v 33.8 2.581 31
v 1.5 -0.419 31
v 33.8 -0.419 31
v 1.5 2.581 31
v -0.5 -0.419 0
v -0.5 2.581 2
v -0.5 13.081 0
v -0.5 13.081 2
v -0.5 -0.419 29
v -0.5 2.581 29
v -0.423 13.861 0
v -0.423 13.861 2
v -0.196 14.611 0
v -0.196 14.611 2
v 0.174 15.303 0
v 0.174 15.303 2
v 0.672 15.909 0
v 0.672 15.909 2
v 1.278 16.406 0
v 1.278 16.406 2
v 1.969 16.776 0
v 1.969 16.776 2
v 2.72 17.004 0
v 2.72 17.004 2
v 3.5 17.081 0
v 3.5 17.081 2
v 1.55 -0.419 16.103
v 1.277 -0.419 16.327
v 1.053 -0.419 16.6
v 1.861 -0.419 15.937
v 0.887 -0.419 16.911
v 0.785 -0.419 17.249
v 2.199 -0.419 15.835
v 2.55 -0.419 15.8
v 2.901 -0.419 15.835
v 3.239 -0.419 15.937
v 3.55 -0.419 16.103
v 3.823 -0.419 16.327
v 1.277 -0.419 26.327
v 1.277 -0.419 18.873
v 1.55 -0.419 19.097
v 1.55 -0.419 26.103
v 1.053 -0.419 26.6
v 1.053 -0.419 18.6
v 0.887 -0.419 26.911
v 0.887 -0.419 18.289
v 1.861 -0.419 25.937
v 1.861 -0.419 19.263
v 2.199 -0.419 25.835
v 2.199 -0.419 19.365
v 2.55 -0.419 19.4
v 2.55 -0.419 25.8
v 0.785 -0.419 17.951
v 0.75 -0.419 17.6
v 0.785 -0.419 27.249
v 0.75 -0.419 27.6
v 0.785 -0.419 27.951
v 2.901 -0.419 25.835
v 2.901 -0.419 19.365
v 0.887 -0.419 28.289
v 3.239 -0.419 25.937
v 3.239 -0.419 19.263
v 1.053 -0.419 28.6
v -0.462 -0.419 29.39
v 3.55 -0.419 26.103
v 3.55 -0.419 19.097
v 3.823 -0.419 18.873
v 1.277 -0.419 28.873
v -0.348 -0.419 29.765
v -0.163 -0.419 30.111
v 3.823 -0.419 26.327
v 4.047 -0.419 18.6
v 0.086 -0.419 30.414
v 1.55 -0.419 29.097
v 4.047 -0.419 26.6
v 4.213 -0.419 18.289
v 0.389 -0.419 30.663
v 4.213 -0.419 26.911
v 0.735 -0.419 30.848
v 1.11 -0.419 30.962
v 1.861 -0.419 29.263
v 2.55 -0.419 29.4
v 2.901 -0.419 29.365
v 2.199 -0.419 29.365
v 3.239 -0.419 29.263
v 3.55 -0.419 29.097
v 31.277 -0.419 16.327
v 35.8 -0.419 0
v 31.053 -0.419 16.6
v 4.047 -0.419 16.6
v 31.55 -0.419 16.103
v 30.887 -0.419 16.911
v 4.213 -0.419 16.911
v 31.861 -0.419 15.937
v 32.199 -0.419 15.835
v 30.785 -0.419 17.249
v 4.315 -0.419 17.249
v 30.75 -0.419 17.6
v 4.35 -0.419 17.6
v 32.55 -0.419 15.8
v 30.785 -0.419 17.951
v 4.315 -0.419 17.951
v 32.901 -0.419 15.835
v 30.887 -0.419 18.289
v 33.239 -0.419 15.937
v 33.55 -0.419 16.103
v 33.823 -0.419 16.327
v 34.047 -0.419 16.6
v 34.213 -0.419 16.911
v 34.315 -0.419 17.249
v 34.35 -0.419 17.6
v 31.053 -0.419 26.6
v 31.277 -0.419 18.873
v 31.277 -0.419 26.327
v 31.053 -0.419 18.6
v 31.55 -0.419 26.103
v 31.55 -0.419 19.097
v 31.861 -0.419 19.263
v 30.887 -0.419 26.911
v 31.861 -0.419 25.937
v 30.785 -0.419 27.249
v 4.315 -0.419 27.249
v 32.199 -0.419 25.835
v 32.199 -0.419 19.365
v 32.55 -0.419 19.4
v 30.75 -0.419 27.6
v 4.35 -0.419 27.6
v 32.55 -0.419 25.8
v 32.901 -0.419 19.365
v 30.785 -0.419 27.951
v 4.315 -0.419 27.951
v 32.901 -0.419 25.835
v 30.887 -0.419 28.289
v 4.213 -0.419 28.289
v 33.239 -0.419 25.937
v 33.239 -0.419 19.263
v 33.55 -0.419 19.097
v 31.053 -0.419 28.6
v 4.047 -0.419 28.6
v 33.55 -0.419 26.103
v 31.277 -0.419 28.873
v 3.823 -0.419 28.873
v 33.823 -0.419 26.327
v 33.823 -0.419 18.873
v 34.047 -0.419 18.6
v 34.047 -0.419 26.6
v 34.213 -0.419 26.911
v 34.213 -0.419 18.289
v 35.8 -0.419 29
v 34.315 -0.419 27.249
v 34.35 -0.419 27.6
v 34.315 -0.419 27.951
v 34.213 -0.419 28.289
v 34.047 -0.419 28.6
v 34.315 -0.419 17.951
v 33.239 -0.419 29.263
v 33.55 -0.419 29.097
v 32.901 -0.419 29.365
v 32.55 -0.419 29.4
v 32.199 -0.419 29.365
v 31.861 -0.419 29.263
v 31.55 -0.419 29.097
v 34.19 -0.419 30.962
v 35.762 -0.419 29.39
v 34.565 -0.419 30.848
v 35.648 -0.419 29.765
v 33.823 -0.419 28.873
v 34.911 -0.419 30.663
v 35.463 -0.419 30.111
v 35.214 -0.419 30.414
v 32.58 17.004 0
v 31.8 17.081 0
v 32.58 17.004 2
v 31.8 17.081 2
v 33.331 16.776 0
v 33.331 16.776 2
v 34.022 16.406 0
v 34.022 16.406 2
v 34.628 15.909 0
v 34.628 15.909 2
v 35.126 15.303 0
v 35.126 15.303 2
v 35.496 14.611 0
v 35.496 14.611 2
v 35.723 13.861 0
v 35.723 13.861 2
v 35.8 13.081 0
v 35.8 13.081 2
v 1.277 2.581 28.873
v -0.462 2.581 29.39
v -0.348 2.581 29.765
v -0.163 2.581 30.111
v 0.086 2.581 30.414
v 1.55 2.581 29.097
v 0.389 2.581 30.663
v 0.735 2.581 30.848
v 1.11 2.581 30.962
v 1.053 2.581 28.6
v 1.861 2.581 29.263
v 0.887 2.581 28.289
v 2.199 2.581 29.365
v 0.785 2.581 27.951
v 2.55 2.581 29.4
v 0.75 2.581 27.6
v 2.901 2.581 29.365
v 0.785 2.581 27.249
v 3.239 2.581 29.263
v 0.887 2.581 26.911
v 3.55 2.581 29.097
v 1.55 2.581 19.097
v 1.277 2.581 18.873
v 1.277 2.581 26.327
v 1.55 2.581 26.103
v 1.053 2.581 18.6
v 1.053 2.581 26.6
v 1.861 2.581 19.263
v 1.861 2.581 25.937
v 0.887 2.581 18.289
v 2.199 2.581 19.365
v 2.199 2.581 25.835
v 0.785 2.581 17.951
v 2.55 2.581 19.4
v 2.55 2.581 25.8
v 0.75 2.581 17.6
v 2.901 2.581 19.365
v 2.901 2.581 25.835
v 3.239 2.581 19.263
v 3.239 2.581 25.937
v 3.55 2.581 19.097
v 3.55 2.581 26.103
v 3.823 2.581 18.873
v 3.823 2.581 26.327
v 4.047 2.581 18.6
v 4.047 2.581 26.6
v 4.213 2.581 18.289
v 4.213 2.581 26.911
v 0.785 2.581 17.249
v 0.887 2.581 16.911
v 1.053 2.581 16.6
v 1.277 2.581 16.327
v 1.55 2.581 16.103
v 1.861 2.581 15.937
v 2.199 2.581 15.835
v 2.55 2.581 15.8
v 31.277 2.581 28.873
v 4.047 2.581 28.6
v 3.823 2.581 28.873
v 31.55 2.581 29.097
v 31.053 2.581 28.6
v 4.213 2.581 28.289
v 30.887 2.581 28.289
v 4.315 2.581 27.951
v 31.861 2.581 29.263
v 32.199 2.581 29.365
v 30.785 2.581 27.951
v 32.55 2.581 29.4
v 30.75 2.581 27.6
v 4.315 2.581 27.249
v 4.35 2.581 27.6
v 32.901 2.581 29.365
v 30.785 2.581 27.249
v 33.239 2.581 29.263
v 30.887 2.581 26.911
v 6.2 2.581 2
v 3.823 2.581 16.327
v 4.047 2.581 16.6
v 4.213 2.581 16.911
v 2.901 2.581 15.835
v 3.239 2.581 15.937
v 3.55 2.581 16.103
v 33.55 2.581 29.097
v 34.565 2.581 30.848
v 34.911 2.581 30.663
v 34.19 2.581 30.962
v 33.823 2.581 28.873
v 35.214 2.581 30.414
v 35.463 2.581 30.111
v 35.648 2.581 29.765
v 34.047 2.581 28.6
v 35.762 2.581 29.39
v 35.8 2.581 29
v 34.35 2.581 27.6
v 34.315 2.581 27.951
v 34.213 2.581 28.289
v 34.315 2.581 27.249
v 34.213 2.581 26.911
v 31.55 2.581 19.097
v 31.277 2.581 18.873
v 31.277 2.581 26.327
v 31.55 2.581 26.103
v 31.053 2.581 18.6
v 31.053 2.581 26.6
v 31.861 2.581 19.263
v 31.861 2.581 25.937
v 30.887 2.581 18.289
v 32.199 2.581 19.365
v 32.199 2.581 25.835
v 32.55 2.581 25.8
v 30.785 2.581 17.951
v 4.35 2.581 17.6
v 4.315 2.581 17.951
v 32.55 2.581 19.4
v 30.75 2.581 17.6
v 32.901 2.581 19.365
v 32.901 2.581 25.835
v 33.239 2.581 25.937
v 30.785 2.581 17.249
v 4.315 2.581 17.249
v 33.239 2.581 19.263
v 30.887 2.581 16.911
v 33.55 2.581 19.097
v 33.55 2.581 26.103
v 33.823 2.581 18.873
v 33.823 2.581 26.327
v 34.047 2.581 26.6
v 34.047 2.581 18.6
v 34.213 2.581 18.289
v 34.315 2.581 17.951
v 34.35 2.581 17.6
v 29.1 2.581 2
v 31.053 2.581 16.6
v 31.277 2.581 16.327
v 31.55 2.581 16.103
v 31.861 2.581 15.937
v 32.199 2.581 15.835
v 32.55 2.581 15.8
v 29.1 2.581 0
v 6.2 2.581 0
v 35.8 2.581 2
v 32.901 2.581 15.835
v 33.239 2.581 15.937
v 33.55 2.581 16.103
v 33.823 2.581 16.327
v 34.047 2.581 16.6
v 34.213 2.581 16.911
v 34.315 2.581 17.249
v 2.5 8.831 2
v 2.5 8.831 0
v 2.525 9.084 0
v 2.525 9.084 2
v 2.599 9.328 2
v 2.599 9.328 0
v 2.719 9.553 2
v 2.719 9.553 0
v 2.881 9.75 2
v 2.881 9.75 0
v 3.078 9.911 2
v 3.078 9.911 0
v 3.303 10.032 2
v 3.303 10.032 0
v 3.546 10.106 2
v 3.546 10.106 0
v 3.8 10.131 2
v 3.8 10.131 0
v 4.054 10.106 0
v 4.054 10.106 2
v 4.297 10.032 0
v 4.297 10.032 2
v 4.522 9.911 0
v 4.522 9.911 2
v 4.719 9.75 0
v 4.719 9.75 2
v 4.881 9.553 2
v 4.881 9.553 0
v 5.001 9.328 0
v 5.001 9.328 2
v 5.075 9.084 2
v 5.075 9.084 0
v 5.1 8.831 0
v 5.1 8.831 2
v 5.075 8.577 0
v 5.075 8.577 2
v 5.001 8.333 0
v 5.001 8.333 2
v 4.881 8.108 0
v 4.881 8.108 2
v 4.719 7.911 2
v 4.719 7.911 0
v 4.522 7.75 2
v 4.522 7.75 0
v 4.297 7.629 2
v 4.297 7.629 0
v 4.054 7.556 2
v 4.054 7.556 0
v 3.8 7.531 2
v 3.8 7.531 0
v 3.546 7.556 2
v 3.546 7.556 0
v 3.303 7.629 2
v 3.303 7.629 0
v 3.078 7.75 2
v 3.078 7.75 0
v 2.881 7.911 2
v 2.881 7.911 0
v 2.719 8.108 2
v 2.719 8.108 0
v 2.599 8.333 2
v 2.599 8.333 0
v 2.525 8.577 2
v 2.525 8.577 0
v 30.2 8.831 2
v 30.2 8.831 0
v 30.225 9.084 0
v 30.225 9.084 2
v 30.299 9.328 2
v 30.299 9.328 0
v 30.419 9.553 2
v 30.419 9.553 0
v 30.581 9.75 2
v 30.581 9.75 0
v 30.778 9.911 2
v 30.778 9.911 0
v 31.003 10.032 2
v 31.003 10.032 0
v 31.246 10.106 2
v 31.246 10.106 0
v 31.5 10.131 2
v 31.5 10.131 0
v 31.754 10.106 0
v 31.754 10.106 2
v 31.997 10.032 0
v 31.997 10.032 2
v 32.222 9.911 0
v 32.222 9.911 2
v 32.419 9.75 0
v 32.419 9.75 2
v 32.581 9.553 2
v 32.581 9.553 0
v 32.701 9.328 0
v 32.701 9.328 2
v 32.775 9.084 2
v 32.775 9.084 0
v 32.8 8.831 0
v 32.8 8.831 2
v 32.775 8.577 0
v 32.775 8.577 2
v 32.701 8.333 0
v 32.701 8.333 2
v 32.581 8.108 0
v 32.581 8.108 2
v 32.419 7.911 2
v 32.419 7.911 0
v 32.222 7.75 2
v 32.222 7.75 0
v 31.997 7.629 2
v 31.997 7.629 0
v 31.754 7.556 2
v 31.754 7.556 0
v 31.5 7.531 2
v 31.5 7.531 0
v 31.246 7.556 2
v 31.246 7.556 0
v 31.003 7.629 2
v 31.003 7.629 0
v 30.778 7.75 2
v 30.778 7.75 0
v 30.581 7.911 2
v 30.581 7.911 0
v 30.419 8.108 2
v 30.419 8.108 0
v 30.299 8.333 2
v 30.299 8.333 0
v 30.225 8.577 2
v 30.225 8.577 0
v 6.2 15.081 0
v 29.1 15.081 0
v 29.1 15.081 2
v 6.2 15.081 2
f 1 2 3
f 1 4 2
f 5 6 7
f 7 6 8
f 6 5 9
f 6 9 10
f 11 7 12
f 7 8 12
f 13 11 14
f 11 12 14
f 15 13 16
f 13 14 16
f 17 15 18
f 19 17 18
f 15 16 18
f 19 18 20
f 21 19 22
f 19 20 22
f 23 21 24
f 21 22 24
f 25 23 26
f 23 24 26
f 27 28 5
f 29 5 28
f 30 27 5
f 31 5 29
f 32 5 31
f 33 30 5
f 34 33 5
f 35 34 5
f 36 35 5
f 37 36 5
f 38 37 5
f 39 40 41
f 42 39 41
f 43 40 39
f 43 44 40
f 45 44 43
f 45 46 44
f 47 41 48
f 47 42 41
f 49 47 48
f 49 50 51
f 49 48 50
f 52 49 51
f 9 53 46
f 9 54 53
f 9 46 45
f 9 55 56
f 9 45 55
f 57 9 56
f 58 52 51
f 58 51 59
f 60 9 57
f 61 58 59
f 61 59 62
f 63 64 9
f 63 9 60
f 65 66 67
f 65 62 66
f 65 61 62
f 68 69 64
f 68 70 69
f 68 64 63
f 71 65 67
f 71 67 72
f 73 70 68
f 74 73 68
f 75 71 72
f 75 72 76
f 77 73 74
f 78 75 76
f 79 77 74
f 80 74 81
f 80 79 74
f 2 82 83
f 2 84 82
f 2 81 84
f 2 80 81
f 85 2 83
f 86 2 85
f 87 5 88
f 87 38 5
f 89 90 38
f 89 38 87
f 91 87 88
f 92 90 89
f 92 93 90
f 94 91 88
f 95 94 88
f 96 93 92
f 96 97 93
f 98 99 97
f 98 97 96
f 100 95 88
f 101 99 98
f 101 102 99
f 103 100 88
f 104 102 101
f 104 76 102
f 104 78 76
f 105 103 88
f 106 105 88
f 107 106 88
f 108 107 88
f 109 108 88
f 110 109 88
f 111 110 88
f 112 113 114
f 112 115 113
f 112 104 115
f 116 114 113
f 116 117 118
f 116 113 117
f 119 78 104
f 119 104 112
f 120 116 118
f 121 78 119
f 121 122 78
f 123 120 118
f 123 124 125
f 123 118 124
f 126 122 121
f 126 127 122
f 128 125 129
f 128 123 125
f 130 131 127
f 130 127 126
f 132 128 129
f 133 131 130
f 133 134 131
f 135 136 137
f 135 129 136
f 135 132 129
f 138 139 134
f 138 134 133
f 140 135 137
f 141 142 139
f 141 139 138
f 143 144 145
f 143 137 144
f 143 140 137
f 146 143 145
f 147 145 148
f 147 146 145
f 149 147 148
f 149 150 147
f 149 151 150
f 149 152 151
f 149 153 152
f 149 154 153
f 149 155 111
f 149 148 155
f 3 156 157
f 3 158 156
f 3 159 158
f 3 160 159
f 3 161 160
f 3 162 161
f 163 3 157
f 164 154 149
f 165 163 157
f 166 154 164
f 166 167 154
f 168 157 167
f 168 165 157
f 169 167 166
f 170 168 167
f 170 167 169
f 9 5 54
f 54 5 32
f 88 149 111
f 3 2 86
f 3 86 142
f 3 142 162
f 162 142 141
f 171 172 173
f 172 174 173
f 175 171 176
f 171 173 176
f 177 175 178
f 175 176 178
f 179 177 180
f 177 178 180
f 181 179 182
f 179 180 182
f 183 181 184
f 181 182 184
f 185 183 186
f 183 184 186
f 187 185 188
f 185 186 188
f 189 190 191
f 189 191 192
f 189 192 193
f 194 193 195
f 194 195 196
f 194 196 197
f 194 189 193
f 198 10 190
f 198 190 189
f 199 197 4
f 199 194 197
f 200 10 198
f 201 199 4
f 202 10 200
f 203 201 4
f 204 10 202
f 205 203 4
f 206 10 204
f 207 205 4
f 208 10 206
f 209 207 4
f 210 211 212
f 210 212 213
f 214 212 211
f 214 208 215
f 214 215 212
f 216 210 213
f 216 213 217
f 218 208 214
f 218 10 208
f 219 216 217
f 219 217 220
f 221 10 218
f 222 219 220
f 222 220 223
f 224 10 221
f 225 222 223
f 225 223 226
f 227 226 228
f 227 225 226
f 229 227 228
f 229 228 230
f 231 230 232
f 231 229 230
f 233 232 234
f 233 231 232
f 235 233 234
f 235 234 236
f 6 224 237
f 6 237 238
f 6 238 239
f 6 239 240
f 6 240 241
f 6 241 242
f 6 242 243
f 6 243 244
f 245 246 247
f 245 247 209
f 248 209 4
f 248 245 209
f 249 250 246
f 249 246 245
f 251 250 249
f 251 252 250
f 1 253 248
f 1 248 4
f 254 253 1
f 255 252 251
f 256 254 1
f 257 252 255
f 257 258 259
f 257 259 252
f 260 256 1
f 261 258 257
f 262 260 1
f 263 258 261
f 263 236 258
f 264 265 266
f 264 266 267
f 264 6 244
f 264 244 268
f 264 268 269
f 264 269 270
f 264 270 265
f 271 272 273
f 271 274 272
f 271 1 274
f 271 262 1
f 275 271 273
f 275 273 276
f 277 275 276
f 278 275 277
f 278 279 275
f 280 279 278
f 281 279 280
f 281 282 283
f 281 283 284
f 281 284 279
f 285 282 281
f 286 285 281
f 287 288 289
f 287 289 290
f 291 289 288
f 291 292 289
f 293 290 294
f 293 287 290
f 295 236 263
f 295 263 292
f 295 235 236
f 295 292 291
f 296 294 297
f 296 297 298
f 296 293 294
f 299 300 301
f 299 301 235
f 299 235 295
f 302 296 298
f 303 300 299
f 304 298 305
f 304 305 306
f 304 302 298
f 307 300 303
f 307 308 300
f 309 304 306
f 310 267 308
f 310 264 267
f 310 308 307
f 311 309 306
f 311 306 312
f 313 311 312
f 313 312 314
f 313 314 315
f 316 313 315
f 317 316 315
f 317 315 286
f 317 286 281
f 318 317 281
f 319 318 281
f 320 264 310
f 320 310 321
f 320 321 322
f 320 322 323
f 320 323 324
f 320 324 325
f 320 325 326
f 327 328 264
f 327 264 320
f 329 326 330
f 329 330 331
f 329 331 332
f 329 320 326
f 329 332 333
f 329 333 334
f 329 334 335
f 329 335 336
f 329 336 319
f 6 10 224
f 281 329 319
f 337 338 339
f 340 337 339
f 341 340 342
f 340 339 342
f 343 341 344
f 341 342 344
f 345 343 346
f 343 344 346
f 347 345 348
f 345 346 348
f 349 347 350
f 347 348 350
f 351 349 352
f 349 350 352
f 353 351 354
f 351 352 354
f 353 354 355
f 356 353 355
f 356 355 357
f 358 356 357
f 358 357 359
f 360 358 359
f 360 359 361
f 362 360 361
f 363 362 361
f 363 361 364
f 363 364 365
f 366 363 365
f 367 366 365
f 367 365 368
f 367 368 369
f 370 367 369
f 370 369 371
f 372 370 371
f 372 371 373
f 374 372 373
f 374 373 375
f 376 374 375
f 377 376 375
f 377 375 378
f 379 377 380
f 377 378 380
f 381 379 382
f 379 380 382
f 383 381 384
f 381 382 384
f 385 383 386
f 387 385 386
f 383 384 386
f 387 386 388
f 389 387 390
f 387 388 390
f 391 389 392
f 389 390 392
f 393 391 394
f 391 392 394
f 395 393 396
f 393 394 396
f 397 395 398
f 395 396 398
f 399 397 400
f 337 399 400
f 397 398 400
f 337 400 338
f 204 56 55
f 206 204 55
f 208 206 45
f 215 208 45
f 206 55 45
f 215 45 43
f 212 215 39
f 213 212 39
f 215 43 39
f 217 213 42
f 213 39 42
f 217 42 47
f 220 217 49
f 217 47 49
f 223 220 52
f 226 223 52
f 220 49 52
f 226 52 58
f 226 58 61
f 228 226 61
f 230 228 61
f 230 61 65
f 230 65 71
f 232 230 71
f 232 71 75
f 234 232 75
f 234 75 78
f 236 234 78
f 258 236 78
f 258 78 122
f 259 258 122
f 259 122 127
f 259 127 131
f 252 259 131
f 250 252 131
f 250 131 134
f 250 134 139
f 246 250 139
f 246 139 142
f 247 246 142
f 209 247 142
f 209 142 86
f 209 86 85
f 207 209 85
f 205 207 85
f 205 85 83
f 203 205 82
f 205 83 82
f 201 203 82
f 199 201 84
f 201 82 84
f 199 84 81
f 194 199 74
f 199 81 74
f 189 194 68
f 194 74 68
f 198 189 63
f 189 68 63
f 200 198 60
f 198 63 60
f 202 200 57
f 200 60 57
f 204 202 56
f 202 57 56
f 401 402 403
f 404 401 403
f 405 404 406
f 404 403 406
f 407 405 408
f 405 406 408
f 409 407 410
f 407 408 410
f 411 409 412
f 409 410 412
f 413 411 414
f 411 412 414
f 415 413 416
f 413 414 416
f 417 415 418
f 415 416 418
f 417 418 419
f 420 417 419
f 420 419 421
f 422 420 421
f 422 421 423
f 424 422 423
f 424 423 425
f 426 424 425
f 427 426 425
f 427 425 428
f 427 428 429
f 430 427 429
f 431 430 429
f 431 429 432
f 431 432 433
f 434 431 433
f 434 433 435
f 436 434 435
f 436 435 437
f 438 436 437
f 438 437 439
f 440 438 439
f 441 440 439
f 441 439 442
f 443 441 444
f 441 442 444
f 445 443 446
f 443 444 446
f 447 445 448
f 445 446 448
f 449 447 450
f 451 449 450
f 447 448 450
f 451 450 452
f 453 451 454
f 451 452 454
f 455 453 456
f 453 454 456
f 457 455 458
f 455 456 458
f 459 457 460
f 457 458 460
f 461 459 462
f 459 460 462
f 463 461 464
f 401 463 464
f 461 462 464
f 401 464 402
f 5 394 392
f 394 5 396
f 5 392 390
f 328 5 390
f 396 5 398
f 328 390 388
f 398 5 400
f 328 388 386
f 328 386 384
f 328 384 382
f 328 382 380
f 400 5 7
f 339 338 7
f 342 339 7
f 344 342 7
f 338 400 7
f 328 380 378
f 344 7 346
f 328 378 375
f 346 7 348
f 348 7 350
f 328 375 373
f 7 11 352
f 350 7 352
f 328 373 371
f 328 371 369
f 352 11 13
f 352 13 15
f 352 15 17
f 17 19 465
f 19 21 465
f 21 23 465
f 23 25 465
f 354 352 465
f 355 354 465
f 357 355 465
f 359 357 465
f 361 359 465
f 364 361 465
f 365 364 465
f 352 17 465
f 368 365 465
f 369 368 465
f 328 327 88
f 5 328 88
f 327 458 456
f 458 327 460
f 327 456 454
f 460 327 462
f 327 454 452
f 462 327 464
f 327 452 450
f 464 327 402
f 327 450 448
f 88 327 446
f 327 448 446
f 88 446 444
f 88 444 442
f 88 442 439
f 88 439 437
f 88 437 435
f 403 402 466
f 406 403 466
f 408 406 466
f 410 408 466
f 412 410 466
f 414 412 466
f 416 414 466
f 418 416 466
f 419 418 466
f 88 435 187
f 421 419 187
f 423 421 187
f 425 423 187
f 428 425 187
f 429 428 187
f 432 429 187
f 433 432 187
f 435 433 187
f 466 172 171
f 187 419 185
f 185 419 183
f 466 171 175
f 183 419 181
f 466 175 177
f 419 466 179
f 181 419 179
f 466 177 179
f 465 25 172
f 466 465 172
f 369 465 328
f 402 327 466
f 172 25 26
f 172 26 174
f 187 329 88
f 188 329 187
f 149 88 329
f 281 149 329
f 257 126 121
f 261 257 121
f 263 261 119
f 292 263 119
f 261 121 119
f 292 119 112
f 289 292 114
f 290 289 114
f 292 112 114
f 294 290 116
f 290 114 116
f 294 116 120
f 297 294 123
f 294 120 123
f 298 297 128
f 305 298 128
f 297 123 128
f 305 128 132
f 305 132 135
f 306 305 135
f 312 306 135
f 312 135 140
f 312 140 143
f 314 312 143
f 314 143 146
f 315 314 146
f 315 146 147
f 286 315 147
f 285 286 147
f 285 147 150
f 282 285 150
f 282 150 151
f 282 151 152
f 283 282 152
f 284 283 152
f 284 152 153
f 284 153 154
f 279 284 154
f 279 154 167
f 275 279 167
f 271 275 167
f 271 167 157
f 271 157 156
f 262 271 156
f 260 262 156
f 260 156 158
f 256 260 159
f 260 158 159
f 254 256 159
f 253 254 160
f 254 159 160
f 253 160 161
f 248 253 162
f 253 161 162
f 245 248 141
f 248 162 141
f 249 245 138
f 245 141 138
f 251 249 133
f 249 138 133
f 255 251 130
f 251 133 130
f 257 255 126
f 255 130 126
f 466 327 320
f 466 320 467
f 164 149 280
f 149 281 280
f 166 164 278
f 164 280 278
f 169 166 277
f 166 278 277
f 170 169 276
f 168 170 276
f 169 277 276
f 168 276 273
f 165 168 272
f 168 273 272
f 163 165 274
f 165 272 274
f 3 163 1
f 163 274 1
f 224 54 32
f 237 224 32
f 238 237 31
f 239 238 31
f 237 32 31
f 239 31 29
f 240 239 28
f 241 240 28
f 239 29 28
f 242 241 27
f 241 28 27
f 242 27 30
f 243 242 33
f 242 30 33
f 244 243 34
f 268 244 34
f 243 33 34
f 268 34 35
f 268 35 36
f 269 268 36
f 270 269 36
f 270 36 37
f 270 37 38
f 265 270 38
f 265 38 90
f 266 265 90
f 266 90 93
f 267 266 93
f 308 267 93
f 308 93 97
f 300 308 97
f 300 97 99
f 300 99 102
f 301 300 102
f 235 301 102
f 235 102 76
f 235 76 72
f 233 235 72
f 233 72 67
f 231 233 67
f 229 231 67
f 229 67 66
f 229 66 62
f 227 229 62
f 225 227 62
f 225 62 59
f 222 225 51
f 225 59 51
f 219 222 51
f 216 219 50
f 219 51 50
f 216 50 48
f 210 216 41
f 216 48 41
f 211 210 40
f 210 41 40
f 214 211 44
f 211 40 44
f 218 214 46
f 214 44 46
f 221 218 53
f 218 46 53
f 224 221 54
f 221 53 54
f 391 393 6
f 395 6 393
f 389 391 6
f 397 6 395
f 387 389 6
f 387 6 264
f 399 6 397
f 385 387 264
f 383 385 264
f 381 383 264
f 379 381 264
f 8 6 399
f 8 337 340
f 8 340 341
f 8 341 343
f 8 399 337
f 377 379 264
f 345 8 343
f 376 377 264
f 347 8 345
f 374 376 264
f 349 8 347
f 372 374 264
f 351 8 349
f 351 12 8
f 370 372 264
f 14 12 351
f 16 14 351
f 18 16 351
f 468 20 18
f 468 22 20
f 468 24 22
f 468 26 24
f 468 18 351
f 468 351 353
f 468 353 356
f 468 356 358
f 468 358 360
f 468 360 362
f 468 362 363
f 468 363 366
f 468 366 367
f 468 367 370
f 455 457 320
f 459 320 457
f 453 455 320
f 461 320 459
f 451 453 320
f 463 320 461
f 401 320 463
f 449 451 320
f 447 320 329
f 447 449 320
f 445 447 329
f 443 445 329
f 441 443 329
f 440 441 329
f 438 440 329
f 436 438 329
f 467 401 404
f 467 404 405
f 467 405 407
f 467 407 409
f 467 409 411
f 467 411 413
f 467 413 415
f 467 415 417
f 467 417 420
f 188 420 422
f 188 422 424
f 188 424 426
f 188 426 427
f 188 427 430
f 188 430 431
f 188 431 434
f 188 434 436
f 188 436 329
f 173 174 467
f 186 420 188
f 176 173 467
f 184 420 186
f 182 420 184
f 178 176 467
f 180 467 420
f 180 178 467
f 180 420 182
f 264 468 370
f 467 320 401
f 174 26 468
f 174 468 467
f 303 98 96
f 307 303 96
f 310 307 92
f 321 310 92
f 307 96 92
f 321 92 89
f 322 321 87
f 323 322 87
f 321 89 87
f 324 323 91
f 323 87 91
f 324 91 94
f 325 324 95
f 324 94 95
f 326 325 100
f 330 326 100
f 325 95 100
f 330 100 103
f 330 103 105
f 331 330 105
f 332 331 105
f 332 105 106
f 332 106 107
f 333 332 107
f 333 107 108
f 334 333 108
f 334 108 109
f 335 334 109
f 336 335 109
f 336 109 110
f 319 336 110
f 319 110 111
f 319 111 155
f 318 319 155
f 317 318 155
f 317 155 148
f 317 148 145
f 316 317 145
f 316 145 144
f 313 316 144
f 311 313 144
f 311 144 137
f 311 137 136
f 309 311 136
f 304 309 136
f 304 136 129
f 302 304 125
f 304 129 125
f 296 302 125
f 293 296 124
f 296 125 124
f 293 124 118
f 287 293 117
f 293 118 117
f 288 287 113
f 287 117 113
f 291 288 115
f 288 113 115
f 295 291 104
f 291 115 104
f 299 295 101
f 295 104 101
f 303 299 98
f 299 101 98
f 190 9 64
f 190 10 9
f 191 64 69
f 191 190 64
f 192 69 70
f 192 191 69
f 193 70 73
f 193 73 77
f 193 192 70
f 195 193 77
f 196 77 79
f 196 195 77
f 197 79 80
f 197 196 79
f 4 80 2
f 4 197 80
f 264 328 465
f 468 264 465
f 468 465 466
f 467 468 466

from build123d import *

# Parameters (mm, degrees)
SKETCH1_W            = 36.3
SKETCH1_H            = 16.5
SKETCH1_W_2          = 22.89999
SKETCH1_H_2          = 12.5
BOSS_EXTRUDE1_DEPTH  = 2
FILLET1_R            = 4
M2_CLEARANCE_HOLE1_D = 2.6
SKETCH4_W            = 36.3
SKETCH4_H            = 3
BOSS_EXTRUDE2_DEPTH  = 29
SKETCH4_2_W          = 36.3
SKETCH4_2_H          = 3
BOSS_EXTRUDE3_DEPTH  = 2
FILLET2_R            = 2
M3_CLEARANCE_HOLE1_D = 3.6


with BuildPart() as part:
    # Sketch1 → Boss-Extrude1 (new body)
    with BuildSketch(Plane.XY):
        with Locations((17.65, 8.830531887)):
            Rectangle(SKETCH1_W, SKETCH1_H)
        with Locations((17.65, 8.830531887)):
            Rectangle(SKETCH1_W_2, SKETCH1_H_2, mode=Mode.SUBTRACT)
    extrude(amount=BOSS_EXTRUDE1_DEPTH)

    # Fillet1
    fillet1_edges = [part.edges().sort_by_distance(p)[0] for p in [
        (-0.5, 17.080531887, 1),
        (35.8, 17.080531887, 1),
    ]]
    fillet(fillet1_edges, radius=FILLET1_R)

    # M2 Clearance Hole1 (through all)
    with Locations(Plane.XY.offset(2)):
        with Locations((31.5, 8.830531887), (3.8, 8.830531887)):
            Hole(M2_CLEARANCE_HOLE1_D / 2)

    # Sketch4 → Boss-Extrude2 (add)
    with BuildSketch(Plane.XY.offset(2)):
        with Locations((17.65, 1.080531887)):
            Rectangle(SKETCH4_W, SKETCH4_H)
    extrude(amount=BOSS_EXTRUDE2_DEPTH)

    # Sketch4<2> → Boss-Extrude3 (add)
    with BuildSketch(Plane.XY.offset(2)):
        with Locations((17.65, 1.080531887)):
            Rectangle(SKETCH4_2_W, SKETCH4_2_H)
    extrude(amount=-BOSS_EXTRUDE3_DEPTH)

    # Fillet2
    fillet2_edges = [part.edges().sort_by_distance(p)[0] for p in [
        (-0.5, 1.080531887, 31),
        (35.8, 1.080531887, 31),
    ]]
    fillet(fillet2_edges, radius=FILLET2_R)

    # M3 Clearance Hole1 (through all)
    with Locations(Plane(origin=(0, 2.580531887, 0), x_dir=(1, 0, 0), z_dir=(0, 1, 0))):
        with Locations((2.550005, -17.6), (2.550005, -27.6), (32.550005, -17.6), (32.550005, -27.6)):
            Hole(M3_CLEARANCE_HOLE1_D / 2)


solid = part.part
